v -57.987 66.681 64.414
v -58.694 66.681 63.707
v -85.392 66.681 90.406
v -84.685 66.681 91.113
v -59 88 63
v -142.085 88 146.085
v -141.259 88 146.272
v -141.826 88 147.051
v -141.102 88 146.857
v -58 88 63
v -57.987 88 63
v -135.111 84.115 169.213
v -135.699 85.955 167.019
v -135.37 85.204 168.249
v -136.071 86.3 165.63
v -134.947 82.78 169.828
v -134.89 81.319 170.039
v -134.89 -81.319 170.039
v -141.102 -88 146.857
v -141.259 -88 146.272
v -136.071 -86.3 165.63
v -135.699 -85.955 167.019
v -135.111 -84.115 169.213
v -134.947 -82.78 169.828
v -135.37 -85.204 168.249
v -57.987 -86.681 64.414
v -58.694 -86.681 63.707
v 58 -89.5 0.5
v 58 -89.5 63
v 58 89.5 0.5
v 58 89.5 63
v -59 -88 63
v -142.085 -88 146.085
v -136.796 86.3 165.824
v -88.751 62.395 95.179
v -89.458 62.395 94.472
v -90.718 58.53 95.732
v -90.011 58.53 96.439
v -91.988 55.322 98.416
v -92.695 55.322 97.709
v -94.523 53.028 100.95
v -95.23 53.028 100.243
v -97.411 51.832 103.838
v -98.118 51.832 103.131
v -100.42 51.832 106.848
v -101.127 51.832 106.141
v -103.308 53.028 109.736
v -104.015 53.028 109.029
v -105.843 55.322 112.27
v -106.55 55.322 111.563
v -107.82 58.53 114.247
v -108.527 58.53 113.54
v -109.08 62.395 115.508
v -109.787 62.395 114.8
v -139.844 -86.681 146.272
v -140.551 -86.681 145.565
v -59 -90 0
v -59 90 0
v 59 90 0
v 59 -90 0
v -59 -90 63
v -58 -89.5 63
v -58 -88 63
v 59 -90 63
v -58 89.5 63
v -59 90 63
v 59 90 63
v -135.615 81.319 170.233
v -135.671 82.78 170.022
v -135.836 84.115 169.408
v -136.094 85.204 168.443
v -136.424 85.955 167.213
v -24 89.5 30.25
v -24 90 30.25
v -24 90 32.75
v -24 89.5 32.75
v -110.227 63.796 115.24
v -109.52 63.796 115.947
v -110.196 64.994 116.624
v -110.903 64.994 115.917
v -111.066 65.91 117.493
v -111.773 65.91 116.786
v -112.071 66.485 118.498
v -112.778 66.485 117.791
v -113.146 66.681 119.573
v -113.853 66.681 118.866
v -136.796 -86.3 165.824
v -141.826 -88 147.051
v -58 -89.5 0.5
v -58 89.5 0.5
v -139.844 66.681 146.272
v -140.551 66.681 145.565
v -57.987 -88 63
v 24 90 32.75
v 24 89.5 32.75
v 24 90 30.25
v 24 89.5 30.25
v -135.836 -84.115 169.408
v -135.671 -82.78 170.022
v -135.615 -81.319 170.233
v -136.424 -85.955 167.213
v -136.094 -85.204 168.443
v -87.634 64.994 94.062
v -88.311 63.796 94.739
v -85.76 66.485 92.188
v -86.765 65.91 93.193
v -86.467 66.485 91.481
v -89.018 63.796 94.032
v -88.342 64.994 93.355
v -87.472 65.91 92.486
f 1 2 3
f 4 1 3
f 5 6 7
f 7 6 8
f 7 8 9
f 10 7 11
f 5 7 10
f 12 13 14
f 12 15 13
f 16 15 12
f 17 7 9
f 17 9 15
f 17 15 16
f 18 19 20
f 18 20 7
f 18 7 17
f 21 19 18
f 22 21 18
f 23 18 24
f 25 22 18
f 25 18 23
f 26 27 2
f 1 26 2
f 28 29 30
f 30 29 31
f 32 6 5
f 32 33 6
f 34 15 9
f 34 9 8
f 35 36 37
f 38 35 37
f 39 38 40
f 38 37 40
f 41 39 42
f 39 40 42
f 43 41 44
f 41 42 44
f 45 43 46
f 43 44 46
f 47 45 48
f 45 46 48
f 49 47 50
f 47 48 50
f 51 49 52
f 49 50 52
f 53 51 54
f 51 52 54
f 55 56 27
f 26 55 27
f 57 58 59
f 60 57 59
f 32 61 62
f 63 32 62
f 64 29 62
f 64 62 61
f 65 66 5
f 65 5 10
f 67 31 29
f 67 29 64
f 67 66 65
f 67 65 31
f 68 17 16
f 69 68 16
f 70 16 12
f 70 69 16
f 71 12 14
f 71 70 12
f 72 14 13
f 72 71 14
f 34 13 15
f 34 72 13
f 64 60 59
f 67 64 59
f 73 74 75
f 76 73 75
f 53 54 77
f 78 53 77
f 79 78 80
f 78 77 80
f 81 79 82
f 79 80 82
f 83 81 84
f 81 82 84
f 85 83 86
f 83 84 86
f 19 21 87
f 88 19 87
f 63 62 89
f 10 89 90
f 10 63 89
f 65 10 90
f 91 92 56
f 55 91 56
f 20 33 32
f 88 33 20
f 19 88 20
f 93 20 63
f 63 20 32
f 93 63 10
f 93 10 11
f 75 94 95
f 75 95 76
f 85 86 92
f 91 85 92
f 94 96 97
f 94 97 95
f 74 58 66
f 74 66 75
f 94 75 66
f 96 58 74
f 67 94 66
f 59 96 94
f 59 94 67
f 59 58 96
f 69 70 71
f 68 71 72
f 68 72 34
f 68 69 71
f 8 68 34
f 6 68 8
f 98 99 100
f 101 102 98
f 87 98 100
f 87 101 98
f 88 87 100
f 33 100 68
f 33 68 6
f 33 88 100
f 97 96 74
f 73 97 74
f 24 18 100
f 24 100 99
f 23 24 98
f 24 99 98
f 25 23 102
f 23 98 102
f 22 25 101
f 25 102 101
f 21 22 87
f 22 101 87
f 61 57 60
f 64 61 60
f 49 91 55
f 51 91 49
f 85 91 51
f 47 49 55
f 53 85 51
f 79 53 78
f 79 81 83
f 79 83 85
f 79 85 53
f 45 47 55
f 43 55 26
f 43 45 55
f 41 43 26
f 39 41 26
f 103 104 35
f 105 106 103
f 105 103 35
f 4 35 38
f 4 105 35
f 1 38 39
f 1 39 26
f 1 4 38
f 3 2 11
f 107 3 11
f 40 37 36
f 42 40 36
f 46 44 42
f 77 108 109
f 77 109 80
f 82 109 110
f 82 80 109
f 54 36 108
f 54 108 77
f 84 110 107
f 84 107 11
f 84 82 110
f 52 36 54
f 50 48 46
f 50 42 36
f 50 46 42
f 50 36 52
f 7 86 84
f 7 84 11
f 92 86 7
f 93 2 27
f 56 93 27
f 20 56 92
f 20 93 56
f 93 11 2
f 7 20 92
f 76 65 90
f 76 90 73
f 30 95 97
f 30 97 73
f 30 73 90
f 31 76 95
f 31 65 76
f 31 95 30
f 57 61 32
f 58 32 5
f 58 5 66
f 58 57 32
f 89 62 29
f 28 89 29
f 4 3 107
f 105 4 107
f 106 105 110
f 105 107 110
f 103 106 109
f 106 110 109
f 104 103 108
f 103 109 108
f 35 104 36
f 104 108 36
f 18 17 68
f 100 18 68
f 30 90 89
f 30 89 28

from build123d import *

# Parameters (mm, degrees)
F0_W          = 118
F0_H          = 180
F1_DEPTH      = 63
F2_W          = 116
F2_H          = 179
F3_DEPTH      = 62.5
F5_DEPTH      = 88
F5_DEPTH_BACK = 88
F6_SIZE2      = 2.0997279246
F6_SIZE       = 24
F6_2_SIZE2    = 2.0997279246
F6_2_SIZE     = 24
F7_R          = 5
F8_W          = 48
F8_H          = 2.5
F9_DEPTH      = 2
F11_DEPTH     = 1


with BuildPart() as f1:
    # F0 (on Top) → F1 (new body)
    with BuildSketch(Plane.XY):
        Rectangle(F0_W, F0_H)
    extrude(amount=F1_DEPTH)

    # F2 (on face) → F3 (cut)
    with BuildSketch(Plane.XY.offset(63)):
        Rectangle(F2_W, F2_H)
    extrude(amount=-F3_DEPTH, mode=Mode.SUBTRACT)

    # F4 (on Front) → F5 (join, two sides)
    with BuildSketch(Plane.XZ) as f5_sk:
        Polygon((-142.0850467894, 146.0850467894), (-59, 63), (-57.9865276814, 63), (-141.2585024524, 146.271974771), (-134.8901262921, 170.0390781628), (-135.6145706619, 170.2331924466), align=None)
    extrude(amount=F5_DEPTH)
    extrude(f5_sk.sketch, amount=-F5_DEPTH_BACK)

    # F6
    f6_edges = [f1.edges().sort_by_distance(p)[0] for p in [
        (-135.252348, -88, 170.136135),
    ]]
    f6_side = f1.faces().sort_by_distance((-100.446161, -88, 104.638886))[0]
    chamfer(f6_edges, length=F6_SIZE, length2=F6_SIZE2, reference=f6_side)

    # F6#2
    f6_2_edges = [f1.edges().sort_by_distance(p)[0] for p in [
        (-135.252348, 88, 170.136135),
    ]]
    f6_2_side = f1.faces().sort_by_distance((-100.446161, 88, 104.638886))[0]
    chamfer(f6_2_edges, length=F6_2_SIZE, length2=F6_2_SIZE2, reference=f6_2_side)

    # F7
    f7_edges = [f1.edges().sort_by_distance(p)[0] for p in [
        (-135.252348, 85.900272, 170.136135),
        (-135.252348, -85.900272, 170.136135),
    ]]
    fillet(f7_edges, radius=F7_R)

    # F8 (on face) → F9 (cut)
    with BuildSketch(Plane(origin=(0, 90, 0), x_dir=(-1, 0, 0), z_dir=(0, 1, 0))):
        with Locations((0, 31.5)):
            Rectangle(F8_W, F8_H)
    extrude(amount=-F9_DEPTH, mode=Mode.SUBTRACT)

    # F10 (on face) → F11 (join)
    with BuildSketch(Plane(origin=(2.5067361593, 0, 2.5067361593), x_dir=(0.7071067812, 0, -0.7071067812), z_dir=(0.7071067812, 0, 0.7071067812))):
        with BuildLine():
            Line((-202.3147502425, -86.6807101745), (-86.5503941557, -86.6807101745))
            Line((-86.5503941557, -86.6807101745), (-86.5503941557, 66.6807101745))
            Line((-86.5503941557, 66.6807101745), (-124.3079604016, 66.6807101745))
            ThreePointArc((-124.3079604016, 66.6807101745), (-127.8936462296, 65.4914125289), (-130.0578494866, 62.3949958888))
            ThreePointArc((-130.0578494866, 62.3949958888), (-144.4325721991, 51.6807101745), (-158.8072949116, 62.3949958888))
            ThreePointArc((-158.8072949116, 62.3949958888), (-160.9714981686, 65.4914125289), (-164.5571839966, 66.6807101745))
            Line((-164.5571839966, 66.6807101745), (-202.3147502425, 66.6807101745))
            Line((-202.3147502425, 66.6807101745), (-202.3147502425, -86.6807101745))
        make_face()
    extrude(amount=F11_DEPTH)


solid = f1.part
